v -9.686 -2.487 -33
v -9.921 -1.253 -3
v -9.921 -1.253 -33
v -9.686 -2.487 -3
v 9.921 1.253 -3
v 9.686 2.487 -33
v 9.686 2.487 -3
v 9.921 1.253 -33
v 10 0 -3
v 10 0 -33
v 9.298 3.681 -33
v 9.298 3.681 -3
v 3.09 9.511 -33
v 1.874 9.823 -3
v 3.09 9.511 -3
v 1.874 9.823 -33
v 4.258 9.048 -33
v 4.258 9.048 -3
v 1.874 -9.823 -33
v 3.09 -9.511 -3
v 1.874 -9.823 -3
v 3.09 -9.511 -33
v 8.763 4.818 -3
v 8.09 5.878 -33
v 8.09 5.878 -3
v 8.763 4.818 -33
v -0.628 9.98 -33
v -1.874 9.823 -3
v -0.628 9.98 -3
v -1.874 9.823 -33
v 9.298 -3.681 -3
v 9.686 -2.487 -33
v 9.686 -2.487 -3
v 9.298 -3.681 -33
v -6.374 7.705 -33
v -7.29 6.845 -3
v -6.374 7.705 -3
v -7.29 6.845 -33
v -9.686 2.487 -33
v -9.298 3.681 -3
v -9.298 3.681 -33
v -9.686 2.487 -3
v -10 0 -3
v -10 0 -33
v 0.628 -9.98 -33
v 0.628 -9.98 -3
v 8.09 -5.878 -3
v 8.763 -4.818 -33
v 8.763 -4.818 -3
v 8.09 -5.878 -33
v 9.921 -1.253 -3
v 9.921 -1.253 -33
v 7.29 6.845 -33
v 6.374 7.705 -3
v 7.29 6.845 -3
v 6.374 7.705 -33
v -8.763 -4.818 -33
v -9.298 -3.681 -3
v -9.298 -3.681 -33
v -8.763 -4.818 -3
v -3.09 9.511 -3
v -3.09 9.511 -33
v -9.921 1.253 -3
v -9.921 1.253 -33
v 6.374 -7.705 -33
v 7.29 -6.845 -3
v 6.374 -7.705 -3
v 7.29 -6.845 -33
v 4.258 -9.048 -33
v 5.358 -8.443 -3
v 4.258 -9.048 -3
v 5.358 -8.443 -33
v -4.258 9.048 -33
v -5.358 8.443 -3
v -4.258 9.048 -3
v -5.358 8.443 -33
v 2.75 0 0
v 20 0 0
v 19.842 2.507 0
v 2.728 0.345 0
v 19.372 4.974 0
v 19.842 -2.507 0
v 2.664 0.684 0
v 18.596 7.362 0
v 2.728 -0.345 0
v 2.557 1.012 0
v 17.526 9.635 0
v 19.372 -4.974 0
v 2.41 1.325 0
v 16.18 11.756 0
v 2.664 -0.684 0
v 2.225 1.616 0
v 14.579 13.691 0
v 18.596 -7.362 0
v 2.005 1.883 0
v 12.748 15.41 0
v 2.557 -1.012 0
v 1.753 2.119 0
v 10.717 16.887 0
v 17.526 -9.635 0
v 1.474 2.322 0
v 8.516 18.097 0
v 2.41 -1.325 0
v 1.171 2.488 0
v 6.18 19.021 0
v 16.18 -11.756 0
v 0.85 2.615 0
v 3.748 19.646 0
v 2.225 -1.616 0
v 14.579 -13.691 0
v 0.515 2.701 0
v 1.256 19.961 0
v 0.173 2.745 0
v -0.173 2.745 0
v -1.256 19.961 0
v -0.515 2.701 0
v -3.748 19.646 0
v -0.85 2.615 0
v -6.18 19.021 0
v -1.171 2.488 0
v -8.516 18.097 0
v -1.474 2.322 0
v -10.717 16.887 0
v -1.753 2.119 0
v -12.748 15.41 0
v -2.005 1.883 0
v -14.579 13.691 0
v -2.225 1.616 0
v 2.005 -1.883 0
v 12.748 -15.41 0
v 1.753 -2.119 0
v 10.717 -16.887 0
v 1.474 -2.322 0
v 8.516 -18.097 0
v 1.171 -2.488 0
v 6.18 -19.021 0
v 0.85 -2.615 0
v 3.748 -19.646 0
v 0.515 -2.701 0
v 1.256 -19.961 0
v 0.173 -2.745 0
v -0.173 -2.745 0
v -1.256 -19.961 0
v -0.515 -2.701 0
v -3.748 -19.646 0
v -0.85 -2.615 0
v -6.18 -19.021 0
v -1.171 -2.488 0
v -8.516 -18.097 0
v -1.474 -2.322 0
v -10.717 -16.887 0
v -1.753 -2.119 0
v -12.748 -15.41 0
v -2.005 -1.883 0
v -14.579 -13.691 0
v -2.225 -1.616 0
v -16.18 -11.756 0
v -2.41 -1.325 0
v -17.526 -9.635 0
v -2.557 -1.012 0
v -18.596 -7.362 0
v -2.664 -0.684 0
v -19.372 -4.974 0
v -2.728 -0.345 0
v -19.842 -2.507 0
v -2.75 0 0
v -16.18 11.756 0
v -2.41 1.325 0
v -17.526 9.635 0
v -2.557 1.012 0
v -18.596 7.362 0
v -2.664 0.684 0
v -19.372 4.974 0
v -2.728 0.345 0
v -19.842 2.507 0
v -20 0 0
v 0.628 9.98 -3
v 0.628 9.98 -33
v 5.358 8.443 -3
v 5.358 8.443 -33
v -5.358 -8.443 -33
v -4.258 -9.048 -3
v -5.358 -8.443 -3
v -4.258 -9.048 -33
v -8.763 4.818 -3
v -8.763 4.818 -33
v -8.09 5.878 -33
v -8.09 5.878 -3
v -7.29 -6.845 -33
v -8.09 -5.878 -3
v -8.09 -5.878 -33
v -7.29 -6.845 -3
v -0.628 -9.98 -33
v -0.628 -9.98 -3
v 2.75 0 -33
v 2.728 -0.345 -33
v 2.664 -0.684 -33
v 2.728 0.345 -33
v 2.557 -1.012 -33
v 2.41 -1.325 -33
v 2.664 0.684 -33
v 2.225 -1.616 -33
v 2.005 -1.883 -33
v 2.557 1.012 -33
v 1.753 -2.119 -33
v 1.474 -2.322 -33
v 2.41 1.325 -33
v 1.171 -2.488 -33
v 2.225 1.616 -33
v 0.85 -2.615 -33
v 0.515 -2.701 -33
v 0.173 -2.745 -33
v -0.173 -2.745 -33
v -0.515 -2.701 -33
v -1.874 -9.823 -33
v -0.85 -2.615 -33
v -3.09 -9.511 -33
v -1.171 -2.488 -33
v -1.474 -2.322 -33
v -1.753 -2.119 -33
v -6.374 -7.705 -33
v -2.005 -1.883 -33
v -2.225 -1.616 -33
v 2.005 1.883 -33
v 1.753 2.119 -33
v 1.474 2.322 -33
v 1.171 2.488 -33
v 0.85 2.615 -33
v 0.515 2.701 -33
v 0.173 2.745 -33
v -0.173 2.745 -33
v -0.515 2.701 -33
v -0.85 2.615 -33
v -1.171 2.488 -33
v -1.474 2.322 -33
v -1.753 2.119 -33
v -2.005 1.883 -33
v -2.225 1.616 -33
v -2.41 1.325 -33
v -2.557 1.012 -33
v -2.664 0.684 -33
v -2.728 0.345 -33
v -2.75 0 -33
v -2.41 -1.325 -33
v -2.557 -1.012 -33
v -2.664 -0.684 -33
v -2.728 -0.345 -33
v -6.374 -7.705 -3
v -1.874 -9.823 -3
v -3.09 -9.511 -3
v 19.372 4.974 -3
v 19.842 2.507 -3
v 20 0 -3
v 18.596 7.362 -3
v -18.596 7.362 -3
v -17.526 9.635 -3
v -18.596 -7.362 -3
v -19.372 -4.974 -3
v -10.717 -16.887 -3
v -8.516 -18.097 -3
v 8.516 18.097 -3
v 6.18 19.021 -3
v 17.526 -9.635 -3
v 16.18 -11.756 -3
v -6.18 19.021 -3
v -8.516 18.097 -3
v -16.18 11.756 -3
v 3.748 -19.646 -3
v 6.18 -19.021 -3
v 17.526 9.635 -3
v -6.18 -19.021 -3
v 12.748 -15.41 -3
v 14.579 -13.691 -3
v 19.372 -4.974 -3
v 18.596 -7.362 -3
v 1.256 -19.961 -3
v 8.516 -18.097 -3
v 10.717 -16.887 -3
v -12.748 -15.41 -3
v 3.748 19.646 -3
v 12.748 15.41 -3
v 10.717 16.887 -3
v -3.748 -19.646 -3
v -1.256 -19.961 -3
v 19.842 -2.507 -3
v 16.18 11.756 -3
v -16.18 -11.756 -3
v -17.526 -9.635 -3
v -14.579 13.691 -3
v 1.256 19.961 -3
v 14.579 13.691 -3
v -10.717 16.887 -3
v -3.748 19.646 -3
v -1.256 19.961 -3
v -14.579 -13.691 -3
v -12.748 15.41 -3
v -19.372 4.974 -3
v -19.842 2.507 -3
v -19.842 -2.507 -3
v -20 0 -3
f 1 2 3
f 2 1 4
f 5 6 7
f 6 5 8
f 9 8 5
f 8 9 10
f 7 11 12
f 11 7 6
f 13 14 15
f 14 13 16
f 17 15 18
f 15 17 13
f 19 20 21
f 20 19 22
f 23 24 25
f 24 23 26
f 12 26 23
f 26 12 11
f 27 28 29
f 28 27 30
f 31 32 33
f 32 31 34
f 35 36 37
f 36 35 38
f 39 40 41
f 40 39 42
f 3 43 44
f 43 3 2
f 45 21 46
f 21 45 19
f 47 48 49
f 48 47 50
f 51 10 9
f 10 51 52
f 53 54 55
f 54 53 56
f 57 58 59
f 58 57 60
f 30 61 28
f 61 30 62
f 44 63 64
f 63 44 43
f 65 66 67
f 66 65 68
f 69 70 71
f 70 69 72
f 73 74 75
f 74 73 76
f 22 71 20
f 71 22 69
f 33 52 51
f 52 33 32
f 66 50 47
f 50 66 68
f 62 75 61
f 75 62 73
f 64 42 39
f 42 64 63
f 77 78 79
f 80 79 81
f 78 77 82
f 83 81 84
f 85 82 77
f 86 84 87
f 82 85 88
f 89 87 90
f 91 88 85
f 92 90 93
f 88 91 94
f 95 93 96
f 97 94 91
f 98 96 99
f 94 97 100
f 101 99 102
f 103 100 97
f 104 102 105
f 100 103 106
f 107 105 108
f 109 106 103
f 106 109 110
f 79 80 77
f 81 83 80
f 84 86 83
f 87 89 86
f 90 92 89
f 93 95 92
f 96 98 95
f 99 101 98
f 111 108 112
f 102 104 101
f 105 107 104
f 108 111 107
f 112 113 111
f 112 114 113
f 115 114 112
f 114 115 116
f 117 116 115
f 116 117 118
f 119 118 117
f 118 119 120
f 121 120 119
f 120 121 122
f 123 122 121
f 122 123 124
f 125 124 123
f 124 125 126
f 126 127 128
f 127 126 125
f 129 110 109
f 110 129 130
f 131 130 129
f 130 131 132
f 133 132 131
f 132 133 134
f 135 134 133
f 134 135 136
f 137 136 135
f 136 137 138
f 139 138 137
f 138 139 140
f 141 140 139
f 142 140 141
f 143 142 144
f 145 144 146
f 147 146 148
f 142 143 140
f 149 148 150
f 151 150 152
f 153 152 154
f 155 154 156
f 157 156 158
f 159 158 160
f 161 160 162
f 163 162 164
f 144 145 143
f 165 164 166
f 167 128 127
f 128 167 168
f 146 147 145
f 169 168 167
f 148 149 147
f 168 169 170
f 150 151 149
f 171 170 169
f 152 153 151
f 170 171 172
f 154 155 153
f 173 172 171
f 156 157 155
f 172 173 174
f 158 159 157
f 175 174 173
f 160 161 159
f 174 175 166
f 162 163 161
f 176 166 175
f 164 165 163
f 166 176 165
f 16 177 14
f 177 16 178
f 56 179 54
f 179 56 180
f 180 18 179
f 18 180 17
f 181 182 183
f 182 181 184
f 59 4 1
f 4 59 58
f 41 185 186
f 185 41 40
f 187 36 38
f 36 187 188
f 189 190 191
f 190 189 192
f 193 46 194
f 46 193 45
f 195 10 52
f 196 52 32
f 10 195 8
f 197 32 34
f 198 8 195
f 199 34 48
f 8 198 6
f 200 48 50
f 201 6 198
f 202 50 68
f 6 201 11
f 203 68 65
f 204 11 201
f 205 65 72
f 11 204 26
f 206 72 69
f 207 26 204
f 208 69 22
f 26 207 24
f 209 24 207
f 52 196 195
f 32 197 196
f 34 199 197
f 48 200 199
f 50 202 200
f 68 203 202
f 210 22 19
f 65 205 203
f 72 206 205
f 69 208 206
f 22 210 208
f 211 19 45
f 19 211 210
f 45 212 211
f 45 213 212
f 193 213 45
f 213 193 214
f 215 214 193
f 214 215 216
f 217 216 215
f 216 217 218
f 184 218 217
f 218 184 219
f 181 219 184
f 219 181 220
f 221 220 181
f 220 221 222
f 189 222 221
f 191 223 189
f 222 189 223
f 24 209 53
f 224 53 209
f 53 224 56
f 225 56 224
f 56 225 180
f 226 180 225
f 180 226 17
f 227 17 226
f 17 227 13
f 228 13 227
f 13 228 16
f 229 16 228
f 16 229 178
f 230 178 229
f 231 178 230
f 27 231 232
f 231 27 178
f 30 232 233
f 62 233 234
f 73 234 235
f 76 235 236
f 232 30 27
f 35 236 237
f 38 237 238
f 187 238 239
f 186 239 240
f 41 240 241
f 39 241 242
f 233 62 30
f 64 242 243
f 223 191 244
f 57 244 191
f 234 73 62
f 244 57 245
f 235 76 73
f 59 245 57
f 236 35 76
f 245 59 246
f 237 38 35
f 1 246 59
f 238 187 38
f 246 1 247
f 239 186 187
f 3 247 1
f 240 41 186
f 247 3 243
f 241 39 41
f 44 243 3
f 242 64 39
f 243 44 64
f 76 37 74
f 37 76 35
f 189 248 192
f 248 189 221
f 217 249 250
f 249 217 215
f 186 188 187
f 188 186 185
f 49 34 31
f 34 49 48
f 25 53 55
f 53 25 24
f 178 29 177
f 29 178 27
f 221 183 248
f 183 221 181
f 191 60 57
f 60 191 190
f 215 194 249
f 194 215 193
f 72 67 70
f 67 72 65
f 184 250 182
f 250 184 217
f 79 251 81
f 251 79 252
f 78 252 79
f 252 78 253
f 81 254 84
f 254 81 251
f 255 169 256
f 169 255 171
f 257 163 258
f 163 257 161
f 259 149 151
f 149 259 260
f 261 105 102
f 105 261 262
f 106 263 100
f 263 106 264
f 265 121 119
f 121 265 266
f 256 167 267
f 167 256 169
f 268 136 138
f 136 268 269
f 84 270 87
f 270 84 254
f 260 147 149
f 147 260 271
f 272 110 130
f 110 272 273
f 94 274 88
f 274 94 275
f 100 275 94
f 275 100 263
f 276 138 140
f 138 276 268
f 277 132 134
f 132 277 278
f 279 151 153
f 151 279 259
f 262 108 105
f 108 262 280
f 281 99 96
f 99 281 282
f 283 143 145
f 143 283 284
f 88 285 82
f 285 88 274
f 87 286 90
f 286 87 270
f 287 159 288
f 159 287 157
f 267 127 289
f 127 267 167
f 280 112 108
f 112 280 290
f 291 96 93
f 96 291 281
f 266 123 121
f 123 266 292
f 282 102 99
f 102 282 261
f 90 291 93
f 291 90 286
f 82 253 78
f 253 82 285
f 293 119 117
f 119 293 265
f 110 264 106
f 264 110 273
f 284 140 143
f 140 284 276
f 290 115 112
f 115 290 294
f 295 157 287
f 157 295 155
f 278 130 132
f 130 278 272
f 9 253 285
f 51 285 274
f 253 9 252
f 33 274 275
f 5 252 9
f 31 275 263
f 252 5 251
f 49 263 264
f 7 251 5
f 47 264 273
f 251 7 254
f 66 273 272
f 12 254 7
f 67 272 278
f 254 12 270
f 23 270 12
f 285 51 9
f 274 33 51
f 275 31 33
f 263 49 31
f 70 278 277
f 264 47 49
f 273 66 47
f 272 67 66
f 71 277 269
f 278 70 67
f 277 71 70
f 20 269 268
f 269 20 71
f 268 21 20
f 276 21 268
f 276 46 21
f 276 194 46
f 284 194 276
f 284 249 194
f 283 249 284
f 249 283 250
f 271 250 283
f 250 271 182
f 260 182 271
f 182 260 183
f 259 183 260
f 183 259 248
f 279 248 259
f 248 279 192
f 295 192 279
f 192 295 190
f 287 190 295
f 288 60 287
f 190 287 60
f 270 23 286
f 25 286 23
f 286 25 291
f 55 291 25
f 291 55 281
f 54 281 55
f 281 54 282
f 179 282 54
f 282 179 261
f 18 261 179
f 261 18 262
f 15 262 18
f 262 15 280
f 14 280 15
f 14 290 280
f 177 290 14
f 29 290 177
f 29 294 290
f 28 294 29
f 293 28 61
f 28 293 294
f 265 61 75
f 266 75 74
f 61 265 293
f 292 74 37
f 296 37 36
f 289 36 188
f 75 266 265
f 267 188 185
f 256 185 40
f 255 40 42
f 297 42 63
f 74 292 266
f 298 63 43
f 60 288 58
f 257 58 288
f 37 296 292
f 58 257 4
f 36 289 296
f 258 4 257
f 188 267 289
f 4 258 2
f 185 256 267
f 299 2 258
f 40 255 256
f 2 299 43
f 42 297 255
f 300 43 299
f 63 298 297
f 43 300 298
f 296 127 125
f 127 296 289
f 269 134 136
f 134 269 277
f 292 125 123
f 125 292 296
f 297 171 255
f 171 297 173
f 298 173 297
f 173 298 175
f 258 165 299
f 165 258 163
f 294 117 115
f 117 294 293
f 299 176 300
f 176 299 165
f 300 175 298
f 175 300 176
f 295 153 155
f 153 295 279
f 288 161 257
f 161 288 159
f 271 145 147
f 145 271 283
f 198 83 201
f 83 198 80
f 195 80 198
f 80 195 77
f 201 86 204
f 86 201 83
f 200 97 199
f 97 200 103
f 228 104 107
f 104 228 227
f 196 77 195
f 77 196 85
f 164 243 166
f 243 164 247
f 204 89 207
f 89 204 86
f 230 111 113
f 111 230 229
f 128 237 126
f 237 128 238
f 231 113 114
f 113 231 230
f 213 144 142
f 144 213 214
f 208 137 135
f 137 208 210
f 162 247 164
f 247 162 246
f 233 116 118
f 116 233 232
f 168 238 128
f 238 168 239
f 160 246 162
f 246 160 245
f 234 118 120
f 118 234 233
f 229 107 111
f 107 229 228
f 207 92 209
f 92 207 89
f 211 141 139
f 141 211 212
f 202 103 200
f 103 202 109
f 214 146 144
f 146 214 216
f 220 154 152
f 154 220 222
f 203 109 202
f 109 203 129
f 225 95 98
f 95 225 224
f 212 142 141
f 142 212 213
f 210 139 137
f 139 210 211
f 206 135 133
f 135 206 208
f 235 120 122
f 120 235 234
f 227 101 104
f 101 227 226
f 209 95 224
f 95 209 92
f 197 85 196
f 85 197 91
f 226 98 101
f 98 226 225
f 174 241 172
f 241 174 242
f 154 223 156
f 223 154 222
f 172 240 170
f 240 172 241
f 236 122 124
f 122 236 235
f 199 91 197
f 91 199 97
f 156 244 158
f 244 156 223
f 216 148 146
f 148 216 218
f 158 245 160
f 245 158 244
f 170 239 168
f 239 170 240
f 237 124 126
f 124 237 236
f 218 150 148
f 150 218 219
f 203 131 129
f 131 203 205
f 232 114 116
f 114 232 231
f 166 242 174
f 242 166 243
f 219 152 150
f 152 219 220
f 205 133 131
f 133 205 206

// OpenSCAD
$fn = 50;


difference() {
	union() {
		translate(v = [0, 0, -33.0000000000]) {
			cylinder(h = 33, r = 10.0000000000);
		}
		translate(v = [0, 0, -3.0000000000]) {
			cylinder(h = 3, r = 20.0000000000);
		}
	}
	union() {
		#translate(v = [0, 0, -33]) {
			cylinder(h = 33, r = 2.7500000000);
		}
	}
}
